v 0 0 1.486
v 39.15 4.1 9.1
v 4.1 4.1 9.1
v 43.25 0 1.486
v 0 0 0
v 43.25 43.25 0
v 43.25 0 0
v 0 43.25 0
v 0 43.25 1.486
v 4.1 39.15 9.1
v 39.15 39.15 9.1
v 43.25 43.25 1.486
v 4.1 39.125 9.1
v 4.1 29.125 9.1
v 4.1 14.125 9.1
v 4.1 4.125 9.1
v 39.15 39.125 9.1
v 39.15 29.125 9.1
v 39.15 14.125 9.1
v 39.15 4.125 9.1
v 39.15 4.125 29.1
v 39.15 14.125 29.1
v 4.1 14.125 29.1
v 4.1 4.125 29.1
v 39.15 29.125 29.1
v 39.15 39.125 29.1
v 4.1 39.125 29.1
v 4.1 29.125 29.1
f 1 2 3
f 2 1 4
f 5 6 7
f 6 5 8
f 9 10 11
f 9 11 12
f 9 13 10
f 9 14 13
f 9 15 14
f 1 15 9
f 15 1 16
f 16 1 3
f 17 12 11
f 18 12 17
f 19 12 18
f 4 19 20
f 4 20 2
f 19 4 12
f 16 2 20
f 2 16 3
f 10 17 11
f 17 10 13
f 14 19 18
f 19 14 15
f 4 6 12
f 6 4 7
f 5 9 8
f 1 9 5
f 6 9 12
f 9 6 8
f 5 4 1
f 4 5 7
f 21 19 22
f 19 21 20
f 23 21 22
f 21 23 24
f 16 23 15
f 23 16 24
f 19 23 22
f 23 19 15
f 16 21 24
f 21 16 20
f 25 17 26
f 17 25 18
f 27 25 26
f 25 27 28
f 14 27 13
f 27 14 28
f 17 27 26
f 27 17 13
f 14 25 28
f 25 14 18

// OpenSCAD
// Phone width in mm (iPhone4/S=9.3, iPhone5=7.6, iPhone6=7.05)
//phone_width=9.5; // XPeria Arc
phone_width=15; // Galaxy Mini with rubber case

// Width of the base of your tripod mount
base_width=43.25;

// Height of the slanted area of your tripod mount
base_height=9.1;

// Difference in width between the base and top of the mount
base_inset=4.1;

// Difference in width between the base bottom width and width if it hadn't been chopped off
base_cutout = 0.8;

// Width of the holder bars
holder_width=10;

// Height of the holder bars
holder_height=20;

base_width_2 = base_width + base_cutout;

phone_width_2 = phone_width + 0.05; // add a tiny bit of extra so phone can slide in

union() {

// base
intersection() {
    //slanted cube
	polyhedron(points=[[-base_cutout,-base_cutout,0],
                   [base_inset,base_inset,base_height],
                   [-base_cutout,base_width+base_cutout,0],
                   [base_inset,base_width-base_inset,base_height],
                   [base_width+base_cutout,base_width+base_cutout,0],
                   [base_width-base_inset,base_width-base_inset,base_height],
                   [base_width+base_cutout,-base_cutout,0],
                   [base_width-base_inset,base_inset,base_height]],
           triangles=[[2,1,0],[1,2,3],[4,3,2],[3,4,5],[6,5,4],[5,6,7],[0,7,6],[7,0,1],
				     [4,2,0],[0,6,4],[1,3,5],[5,7,1]]
           );
	
	//whatever the bigger shape, clip it to base_width
	cube([base_width,base_width,50]);
}

// phone holder
translate([base_inset,base_width-base_width/2-holder_width-phone_width/2,base_height]) 
	cube([base_width-base_inset*2,holder_width,holder_height]);
translate([base_inset,base_width-base_width/2+phone_width/2,base_height])
	cube([base_width-base_inset*2,holder_width,holder_height]);

}
